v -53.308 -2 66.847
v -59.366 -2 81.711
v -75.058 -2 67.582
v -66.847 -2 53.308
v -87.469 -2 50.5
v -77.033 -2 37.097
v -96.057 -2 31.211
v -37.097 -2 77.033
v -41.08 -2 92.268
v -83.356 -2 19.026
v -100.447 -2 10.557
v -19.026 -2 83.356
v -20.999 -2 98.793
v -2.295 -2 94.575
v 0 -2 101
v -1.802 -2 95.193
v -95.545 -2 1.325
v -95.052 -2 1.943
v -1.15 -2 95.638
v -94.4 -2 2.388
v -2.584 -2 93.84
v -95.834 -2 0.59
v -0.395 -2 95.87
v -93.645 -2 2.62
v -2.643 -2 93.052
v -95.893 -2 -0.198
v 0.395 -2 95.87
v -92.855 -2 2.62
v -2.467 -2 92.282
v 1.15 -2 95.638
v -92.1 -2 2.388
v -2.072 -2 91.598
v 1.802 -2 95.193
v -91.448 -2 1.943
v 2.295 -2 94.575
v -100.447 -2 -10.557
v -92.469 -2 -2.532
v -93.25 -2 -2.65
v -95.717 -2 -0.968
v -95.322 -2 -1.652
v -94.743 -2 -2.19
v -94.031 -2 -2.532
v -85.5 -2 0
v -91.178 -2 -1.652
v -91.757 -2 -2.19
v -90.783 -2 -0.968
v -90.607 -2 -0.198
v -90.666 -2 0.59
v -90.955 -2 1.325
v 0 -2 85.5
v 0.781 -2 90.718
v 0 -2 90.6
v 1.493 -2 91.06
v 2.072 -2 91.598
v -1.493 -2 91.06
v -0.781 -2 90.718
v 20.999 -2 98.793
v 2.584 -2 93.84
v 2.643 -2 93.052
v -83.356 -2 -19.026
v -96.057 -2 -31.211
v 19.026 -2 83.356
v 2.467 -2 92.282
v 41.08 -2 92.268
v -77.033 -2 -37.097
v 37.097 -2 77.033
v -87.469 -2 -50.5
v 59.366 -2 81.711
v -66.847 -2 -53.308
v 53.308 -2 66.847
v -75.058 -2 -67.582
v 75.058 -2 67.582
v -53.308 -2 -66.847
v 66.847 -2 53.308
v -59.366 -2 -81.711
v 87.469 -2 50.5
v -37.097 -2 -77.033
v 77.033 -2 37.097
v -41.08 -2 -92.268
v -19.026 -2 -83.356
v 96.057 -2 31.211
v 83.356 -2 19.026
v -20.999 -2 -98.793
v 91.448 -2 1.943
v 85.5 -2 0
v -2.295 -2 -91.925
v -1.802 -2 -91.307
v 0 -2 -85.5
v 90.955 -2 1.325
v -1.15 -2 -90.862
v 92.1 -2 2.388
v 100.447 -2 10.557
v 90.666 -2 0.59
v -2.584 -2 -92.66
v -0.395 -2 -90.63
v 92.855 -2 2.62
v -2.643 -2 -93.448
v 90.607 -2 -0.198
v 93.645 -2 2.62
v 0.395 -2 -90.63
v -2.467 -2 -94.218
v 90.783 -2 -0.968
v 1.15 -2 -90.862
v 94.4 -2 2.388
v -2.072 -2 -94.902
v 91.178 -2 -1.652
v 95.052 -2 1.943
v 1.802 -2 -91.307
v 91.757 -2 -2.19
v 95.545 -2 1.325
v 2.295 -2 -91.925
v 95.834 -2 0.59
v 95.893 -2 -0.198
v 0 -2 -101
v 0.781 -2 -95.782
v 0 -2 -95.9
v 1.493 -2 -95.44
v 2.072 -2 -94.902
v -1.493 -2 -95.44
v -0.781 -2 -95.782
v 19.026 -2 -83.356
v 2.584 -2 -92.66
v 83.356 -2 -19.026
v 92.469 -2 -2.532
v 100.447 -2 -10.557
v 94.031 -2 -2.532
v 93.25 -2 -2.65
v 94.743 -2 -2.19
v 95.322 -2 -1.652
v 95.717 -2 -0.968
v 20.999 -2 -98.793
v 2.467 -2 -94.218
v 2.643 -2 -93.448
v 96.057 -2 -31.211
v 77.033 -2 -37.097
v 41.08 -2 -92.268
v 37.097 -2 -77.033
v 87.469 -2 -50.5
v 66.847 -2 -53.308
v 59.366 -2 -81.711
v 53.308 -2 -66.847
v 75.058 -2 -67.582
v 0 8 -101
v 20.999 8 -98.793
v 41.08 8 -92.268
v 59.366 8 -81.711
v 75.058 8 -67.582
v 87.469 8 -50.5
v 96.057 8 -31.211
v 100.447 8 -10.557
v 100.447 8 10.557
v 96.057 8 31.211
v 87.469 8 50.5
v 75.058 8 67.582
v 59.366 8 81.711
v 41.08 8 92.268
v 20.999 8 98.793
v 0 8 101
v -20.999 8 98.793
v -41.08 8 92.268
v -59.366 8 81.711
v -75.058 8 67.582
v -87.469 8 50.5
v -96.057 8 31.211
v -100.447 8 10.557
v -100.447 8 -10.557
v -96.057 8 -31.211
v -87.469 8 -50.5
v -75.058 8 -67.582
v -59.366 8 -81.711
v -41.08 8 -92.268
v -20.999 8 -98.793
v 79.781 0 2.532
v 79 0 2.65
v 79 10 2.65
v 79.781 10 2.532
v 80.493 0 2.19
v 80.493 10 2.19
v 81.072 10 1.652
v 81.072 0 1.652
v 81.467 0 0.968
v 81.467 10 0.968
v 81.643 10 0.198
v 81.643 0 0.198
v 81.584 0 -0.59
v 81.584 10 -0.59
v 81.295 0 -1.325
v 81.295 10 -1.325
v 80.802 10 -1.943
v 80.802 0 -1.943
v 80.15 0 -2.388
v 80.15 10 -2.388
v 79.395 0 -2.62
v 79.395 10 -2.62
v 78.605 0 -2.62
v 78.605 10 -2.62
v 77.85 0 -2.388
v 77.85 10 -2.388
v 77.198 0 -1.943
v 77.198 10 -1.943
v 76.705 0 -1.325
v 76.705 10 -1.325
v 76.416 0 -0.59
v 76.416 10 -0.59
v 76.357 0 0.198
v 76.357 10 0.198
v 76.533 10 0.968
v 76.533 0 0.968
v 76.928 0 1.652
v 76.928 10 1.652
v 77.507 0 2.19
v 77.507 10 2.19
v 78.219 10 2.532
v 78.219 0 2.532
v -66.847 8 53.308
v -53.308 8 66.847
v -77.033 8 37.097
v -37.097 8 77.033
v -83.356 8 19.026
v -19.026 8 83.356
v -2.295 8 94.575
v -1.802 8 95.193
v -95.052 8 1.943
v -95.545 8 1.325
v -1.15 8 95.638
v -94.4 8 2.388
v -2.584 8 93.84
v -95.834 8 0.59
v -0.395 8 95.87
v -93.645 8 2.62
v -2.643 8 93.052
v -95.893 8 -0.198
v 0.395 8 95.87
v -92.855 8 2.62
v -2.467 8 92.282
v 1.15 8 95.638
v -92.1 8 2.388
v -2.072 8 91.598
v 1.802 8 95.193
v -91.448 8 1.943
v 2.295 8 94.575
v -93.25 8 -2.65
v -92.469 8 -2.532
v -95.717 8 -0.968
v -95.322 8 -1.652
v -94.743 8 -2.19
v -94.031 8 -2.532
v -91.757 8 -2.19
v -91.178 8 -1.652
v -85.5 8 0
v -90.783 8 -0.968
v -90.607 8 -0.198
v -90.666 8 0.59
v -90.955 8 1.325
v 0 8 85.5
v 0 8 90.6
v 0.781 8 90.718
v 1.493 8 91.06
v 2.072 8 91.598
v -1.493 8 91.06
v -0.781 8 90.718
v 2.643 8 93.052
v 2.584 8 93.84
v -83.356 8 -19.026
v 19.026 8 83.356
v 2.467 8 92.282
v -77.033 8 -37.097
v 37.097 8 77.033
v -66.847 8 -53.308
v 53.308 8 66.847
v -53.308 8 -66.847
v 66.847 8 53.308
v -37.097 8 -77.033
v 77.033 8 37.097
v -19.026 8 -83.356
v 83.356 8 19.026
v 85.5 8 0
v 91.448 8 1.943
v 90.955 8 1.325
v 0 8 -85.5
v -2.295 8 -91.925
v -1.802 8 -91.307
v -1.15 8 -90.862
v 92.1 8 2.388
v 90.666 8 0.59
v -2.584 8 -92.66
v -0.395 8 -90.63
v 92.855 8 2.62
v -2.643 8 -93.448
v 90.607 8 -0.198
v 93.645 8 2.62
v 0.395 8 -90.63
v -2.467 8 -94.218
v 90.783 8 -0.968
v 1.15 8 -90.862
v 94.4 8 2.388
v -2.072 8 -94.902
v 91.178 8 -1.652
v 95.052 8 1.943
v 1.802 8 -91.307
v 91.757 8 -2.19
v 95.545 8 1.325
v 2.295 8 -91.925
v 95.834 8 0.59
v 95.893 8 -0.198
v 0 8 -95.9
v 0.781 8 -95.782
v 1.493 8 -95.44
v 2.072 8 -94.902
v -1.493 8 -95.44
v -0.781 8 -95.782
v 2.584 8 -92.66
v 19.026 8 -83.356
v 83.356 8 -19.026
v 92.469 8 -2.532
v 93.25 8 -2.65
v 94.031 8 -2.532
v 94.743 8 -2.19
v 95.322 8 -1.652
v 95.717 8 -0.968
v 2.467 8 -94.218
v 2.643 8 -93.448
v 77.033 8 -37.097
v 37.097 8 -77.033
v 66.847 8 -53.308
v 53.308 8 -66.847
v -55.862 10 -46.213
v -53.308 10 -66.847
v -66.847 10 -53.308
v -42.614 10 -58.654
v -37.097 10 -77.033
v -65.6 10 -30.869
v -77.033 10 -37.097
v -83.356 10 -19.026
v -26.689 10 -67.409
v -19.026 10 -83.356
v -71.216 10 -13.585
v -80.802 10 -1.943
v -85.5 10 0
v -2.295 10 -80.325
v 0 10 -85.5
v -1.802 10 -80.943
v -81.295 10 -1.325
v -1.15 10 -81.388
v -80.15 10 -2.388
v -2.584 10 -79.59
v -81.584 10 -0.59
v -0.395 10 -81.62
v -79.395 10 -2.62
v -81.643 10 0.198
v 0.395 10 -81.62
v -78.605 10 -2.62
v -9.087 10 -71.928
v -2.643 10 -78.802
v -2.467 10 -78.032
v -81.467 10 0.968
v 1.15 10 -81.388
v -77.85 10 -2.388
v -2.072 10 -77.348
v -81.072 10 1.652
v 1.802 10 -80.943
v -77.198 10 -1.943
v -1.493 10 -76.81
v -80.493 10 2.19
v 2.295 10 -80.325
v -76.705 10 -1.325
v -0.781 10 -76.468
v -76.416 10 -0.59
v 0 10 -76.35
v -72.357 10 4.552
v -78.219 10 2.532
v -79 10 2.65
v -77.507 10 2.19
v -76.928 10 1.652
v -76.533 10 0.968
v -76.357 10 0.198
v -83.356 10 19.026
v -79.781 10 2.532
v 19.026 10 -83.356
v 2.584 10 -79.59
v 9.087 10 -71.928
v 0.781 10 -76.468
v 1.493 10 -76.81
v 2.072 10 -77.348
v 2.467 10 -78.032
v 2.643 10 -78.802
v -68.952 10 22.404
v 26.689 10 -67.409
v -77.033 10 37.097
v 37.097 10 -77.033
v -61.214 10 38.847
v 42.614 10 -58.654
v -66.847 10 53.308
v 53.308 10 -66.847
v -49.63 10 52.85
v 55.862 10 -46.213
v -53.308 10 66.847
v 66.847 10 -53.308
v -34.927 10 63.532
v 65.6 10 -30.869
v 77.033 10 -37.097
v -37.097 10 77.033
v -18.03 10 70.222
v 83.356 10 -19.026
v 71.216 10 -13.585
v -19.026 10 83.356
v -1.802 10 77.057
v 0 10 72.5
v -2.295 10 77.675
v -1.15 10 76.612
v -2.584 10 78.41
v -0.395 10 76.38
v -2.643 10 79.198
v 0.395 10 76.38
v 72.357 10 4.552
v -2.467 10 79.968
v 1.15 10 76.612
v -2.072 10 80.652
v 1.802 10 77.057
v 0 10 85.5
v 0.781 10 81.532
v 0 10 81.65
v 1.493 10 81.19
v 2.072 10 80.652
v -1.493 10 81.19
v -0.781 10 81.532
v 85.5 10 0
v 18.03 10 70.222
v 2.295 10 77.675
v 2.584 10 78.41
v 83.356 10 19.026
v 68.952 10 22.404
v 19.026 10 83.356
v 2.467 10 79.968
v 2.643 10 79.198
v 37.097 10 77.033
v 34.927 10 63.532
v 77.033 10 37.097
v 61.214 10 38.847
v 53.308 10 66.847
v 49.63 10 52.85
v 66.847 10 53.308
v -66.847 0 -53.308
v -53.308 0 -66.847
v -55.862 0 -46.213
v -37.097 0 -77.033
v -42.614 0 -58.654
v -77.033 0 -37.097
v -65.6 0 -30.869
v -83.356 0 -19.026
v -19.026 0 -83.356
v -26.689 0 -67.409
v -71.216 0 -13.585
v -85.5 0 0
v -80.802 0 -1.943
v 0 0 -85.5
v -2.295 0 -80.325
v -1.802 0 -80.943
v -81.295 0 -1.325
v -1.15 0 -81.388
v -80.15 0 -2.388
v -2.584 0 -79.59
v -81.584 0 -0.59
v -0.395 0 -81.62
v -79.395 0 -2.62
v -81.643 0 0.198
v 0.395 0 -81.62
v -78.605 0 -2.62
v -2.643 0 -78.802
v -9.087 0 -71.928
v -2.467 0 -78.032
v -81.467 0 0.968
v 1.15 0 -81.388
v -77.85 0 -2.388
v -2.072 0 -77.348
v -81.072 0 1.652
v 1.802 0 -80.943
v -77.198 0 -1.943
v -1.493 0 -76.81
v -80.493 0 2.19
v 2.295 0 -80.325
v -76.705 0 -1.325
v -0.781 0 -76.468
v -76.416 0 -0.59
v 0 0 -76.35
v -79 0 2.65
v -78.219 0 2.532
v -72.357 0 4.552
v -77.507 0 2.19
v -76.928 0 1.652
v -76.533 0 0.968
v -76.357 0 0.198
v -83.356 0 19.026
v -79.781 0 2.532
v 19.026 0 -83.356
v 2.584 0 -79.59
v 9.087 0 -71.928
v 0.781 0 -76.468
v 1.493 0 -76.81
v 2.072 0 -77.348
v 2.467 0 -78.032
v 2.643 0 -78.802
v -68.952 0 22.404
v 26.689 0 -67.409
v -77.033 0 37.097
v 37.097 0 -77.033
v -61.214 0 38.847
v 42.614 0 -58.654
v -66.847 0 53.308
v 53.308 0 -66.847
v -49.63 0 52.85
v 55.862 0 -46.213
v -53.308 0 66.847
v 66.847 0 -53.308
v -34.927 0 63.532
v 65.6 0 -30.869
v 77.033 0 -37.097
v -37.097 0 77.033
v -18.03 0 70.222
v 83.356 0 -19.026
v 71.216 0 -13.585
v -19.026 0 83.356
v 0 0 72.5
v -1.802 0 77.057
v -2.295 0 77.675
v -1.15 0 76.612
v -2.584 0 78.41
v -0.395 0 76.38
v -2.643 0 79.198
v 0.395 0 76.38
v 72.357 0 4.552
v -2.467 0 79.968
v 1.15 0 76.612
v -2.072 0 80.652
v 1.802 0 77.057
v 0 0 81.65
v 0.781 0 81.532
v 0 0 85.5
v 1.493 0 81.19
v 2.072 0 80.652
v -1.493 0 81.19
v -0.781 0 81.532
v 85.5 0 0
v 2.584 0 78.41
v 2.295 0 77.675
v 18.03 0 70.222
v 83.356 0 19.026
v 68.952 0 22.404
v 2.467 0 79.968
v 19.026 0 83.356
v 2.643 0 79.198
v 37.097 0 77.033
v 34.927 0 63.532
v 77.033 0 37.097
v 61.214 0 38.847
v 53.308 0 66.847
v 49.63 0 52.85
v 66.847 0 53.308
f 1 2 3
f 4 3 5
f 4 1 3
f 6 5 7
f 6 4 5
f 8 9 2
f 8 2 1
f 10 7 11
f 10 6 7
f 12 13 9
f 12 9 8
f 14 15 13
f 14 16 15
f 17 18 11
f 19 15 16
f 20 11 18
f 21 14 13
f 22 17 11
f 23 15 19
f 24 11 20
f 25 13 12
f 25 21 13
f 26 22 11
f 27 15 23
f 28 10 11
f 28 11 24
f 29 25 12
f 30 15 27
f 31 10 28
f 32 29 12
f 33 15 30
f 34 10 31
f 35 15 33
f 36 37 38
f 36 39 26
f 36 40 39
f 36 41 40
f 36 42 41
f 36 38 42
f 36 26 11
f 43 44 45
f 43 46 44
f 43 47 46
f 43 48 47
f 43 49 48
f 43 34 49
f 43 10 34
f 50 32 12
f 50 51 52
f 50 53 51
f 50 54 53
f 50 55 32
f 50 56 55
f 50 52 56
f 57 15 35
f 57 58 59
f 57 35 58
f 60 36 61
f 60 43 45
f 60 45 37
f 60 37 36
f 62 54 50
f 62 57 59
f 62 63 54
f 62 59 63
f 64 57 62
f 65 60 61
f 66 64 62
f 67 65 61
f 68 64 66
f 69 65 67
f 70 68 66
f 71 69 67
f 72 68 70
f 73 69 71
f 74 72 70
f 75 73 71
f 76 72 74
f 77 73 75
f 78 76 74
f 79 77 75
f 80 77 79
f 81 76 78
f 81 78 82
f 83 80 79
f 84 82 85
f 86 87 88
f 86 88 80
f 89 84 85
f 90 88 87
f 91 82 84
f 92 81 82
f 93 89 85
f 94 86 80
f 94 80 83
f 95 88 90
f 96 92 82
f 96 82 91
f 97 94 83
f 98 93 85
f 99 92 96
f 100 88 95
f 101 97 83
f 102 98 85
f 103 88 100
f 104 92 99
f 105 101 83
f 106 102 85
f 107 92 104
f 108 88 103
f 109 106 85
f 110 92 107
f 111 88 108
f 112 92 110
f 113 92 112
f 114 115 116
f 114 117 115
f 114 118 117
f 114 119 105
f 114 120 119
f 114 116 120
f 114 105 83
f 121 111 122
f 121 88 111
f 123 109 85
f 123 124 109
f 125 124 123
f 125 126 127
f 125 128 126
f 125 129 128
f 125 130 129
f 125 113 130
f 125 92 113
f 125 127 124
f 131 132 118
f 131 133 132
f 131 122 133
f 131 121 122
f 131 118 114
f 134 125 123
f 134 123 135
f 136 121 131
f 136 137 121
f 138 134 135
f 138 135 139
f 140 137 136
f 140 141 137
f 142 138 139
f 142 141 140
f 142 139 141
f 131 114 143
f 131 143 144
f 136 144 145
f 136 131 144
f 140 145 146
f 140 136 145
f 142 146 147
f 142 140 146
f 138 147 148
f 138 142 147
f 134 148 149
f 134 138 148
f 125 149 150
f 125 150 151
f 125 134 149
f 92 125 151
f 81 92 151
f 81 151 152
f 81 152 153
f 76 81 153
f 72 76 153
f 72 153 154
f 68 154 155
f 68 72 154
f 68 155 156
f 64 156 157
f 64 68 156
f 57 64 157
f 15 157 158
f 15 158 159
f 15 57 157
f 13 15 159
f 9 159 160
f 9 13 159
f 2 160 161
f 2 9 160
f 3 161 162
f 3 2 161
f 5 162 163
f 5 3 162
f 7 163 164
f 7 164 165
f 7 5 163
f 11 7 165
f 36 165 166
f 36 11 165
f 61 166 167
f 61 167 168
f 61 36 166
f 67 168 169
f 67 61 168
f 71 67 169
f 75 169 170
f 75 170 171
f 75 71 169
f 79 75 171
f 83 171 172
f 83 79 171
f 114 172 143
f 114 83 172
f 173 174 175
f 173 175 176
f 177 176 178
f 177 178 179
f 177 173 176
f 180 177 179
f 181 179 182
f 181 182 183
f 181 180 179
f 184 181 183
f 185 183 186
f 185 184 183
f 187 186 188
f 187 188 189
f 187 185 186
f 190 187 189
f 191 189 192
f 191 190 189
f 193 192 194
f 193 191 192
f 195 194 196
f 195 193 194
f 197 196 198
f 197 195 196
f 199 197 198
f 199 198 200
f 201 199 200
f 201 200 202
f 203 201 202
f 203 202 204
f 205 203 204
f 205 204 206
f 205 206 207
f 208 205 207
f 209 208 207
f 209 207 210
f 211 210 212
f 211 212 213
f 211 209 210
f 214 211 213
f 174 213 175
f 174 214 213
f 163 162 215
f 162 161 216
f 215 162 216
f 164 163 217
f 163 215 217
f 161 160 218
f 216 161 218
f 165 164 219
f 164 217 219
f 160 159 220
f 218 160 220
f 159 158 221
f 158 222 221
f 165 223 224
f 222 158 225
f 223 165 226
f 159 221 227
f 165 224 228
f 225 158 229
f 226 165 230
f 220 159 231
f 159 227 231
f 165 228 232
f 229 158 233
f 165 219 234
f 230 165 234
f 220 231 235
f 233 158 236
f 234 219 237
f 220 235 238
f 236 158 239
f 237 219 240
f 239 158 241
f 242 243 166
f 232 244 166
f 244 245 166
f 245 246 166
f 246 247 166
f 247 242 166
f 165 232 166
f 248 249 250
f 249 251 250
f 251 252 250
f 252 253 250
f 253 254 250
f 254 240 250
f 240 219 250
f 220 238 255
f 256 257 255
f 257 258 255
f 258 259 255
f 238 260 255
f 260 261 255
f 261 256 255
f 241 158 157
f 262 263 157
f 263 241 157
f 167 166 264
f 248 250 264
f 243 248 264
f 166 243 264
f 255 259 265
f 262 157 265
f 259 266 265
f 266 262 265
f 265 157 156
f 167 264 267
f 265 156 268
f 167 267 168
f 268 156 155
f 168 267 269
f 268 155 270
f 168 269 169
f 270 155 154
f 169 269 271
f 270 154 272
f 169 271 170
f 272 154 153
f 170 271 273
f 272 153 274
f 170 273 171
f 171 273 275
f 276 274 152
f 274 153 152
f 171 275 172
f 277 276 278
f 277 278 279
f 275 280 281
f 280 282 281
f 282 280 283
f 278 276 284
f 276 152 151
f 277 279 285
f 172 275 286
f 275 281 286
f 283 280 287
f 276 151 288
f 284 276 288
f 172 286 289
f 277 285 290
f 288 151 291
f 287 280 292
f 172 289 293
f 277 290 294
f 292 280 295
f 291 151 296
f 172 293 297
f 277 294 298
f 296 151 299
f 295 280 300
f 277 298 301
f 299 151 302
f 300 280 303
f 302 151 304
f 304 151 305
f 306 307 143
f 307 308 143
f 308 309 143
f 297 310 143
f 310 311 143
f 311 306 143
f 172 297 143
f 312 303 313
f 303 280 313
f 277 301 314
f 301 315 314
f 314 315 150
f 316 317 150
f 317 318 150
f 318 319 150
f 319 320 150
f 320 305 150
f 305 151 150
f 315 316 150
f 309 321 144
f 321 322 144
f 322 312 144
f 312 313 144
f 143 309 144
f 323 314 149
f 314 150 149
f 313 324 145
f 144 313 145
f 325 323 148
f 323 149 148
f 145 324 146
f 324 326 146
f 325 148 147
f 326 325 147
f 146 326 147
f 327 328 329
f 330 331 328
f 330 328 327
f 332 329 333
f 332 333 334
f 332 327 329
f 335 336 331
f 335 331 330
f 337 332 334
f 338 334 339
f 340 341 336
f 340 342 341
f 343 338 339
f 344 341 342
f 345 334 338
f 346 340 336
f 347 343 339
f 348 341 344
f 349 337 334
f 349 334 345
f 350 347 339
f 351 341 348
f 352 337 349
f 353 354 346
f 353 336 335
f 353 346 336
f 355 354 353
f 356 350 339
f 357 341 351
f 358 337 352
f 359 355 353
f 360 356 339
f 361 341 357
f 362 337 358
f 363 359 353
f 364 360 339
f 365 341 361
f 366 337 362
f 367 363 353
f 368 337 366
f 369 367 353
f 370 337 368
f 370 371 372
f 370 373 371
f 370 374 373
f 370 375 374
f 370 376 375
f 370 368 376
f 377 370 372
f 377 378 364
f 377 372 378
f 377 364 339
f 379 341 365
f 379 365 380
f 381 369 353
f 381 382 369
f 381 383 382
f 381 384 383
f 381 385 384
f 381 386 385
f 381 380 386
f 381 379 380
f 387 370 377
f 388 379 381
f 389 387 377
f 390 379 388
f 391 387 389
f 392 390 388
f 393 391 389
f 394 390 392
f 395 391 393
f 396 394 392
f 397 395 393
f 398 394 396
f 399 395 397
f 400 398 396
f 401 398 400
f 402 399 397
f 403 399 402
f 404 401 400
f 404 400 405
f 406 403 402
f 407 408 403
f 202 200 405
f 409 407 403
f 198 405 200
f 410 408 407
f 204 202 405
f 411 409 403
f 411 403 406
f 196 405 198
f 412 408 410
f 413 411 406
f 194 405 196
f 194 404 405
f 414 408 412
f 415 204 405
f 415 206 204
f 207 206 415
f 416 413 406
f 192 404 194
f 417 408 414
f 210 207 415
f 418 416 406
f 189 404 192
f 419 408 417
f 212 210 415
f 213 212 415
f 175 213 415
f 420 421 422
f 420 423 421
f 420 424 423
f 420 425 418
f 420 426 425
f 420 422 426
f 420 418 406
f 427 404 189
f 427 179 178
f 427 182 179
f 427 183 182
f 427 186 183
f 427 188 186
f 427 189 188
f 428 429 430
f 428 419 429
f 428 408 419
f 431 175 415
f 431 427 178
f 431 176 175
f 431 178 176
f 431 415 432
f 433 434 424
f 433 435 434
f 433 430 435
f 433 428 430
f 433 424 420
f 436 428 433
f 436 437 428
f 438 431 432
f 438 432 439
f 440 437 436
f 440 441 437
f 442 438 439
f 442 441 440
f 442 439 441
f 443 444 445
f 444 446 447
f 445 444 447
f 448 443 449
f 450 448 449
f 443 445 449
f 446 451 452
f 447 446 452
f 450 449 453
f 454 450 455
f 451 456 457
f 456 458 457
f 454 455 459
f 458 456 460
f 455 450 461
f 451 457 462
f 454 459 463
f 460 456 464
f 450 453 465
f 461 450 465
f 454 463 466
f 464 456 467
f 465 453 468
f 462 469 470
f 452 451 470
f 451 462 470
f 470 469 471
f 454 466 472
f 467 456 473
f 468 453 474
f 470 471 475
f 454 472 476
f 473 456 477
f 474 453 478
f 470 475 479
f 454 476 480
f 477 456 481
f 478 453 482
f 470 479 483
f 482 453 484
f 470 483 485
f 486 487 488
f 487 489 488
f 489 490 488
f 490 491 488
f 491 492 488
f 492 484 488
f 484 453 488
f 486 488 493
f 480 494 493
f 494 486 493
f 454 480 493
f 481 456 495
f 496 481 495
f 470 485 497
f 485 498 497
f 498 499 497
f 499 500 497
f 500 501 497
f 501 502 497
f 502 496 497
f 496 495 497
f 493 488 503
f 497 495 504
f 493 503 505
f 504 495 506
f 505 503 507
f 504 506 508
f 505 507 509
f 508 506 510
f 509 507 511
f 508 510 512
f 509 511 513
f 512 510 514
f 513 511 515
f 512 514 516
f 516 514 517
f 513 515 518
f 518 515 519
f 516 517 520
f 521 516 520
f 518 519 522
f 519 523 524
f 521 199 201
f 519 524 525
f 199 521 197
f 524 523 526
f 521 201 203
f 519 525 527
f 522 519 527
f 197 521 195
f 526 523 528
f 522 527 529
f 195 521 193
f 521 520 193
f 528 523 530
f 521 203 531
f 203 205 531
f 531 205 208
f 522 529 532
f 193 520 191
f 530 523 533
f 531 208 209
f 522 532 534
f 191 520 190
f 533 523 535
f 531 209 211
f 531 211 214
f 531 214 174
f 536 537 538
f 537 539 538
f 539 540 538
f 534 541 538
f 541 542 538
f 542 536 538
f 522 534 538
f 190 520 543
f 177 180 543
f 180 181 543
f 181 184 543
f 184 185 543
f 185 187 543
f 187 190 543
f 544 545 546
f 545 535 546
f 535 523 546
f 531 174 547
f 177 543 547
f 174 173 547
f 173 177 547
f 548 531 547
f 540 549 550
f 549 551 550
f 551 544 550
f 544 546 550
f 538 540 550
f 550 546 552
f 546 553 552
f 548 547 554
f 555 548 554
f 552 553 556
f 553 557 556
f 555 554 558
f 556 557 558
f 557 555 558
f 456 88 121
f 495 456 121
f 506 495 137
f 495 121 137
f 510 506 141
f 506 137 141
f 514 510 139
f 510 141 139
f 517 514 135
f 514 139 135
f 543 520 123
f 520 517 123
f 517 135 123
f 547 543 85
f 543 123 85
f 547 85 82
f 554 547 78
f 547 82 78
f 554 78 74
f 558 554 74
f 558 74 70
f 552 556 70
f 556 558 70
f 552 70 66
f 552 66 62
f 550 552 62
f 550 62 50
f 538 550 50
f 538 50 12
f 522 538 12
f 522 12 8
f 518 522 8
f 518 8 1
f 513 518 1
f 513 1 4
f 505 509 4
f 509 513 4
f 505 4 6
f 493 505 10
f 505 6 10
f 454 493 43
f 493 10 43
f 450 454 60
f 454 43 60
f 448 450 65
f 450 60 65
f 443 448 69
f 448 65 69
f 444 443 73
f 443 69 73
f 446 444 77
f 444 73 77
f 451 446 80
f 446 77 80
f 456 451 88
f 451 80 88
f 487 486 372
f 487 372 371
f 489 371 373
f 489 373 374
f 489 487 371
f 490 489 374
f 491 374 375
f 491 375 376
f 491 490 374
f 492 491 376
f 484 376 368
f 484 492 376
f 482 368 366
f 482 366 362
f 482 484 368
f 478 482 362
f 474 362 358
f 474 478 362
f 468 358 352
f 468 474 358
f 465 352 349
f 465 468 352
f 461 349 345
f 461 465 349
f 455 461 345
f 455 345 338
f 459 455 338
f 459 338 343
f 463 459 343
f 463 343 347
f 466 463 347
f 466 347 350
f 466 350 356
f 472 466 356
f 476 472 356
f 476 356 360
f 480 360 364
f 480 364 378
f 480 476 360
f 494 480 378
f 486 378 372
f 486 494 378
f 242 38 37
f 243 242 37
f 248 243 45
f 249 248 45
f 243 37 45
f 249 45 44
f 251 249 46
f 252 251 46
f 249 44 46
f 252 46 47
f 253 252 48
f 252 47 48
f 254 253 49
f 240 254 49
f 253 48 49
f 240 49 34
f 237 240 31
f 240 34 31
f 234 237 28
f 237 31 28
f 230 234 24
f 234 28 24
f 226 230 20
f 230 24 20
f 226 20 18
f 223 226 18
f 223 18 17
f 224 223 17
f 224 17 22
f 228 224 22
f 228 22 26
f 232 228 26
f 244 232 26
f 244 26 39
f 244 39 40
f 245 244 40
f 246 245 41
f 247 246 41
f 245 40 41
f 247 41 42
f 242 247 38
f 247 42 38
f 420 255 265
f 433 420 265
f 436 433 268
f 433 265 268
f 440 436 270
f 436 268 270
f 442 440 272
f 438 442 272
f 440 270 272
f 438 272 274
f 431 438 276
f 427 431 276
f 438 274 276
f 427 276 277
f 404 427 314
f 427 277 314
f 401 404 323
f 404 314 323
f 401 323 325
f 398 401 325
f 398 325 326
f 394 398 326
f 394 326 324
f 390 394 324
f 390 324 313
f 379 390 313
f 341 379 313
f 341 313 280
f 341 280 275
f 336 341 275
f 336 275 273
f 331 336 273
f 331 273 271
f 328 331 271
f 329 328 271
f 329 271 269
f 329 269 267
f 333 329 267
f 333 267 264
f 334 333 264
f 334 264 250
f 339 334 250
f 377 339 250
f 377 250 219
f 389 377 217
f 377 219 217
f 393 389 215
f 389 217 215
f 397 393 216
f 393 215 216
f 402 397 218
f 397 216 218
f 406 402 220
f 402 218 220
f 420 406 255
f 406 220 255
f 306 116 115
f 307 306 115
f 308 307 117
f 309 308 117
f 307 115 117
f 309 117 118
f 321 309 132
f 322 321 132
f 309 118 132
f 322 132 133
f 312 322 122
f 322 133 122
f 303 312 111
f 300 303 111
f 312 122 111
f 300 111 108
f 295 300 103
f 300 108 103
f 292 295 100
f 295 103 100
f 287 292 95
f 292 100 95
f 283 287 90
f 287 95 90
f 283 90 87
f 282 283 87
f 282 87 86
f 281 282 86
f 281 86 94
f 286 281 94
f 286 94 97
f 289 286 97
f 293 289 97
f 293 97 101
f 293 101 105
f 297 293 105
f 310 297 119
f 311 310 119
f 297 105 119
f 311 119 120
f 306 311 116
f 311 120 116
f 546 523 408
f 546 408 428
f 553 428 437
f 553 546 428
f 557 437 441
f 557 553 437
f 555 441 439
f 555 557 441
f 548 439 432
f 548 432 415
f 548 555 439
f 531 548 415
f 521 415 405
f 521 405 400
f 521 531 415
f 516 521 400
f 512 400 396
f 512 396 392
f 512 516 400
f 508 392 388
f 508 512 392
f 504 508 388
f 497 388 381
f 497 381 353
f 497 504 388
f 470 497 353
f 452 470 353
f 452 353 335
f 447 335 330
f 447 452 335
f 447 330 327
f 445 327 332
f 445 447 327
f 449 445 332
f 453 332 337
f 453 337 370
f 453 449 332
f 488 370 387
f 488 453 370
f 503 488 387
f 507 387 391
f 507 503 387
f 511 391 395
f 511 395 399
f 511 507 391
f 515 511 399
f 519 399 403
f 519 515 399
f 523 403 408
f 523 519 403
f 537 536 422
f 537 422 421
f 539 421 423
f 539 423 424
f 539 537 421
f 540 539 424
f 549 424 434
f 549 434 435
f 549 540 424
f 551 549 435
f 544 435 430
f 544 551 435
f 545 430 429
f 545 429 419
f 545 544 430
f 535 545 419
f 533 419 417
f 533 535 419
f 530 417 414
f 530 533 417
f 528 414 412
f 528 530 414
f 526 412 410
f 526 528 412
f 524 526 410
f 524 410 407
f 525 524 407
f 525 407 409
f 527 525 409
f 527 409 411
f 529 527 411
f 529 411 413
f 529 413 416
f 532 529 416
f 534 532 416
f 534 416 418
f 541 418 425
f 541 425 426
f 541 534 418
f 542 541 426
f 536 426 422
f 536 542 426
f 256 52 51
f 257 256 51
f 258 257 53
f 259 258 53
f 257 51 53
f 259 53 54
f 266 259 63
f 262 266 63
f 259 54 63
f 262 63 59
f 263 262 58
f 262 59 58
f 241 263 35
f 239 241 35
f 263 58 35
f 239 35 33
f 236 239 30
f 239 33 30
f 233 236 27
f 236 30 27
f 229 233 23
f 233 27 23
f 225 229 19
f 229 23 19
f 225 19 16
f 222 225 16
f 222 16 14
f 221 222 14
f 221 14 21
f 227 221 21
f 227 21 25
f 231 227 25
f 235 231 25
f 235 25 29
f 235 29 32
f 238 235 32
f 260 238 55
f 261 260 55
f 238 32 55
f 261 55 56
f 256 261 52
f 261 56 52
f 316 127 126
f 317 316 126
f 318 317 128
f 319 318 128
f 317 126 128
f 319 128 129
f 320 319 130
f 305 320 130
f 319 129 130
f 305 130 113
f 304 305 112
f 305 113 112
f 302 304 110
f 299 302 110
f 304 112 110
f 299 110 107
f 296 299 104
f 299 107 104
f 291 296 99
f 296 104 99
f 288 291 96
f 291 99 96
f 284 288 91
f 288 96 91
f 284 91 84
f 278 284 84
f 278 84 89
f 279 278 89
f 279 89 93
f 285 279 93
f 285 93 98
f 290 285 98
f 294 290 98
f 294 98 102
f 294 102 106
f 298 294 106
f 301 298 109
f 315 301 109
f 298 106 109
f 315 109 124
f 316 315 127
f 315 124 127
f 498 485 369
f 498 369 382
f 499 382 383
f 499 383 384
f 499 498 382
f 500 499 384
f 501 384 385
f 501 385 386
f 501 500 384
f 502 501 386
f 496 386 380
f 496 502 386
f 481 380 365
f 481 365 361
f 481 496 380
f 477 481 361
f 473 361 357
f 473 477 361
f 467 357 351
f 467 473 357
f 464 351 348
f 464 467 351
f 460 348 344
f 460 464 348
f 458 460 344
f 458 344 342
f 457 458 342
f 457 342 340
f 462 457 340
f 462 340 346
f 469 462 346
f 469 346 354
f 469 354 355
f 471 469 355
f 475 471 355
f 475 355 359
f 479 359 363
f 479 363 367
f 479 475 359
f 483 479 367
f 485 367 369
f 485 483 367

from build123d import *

# Parameters (mm, degrees)
SKETCH_1_R      = 85.5
SKETCH_1_R_2    = 72.5
SKETCH_1_R_3    = 2.65
EXTRUDE_2_DEPTH = 10
SKETCH_2_R      = 101
SKETCH_2_R_2    = 85.5
SKETCH_2_R_3    = 2.65
EXTRUDE_3_DEPTH = 10


with BuildPart() as part:
    # 草图1 → 凸台-拉伸2 (new body)
    with BuildSketch(Plane(origin=(0, 0, 0), x_dir=(1, 0, 0), z_dir=(0, 1, 0))):
        with Locations(Location((0, 0, 0), (0, 0, 270))):
            Circle(SKETCH_1_R)
        with Locations(Location((0, 0, 0), (0, 0, 270))):
            Circle(SKETCH_1_R_2, mode=Mode.SUBTRACT)
        with Locations(Location((0, 79, 0), (0, 0, 270))):
            Circle(SKETCH_1_R_3, mode=Mode.SUBTRACT)
        with Locations(Location((79, 0, 0), (0, 0, 270))):
            Circle(SKETCH_1_R_3, mode=Mode.SUBTRACT)
        with Locations(Location((0, -79, 0), (0, 0, 270))):
            Circle(SKETCH_1_R_3, mode=Mode.SUBTRACT)
        with Locations(Location((-79, 0, 0), (0, 0, 270))):
            Circle(SKETCH_1_R_3, mode=Mode.SUBTRACT)
    extrude(amount=EXTRUDE_2_DEPTH)

    # 草图2 → 凸台-拉伸3 (add)
    with BuildSketch(Plane(origin=(0, -2, 0), x_dir=(-1, 0, 0), z_dir=(0, -1, 0))):
        with Locations(Location((0, 0, 0), (0, 0, 90))):
            Circle(SKETCH_2_R)
        with Locations(Location((0, 0, 0), (0, 0, 90))):
            Circle(SKETCH_2_R_2, mode=Mode.SUBTRACT)
        with Locations(Location((0, 93.25, 0), (0, 0, 90))):
            Circle(SKETCH_2_R_3, mode=Mode.SUBTRACT)
        with Locations(Location((93.25, 0, 0), (0, 0, 90))):
            Circle(SKETCH_2_R_3, mode=Mode.SUBTRACT)
        with Locations(Location((0, -93.25, 0), (0, 0, 90))):
            Circle(SKETCH_2_R_3, mode=Mode.SUBTRACT)
        with Locations(Location((-93.25, 0, 0), (0, 0, 90))):
            Circle(SKETCH_2_R_3, mode=Mode.SUBTRACT)
    extrude(amount=-EXTRUDE_3_DEPTH)


solid = part.part
